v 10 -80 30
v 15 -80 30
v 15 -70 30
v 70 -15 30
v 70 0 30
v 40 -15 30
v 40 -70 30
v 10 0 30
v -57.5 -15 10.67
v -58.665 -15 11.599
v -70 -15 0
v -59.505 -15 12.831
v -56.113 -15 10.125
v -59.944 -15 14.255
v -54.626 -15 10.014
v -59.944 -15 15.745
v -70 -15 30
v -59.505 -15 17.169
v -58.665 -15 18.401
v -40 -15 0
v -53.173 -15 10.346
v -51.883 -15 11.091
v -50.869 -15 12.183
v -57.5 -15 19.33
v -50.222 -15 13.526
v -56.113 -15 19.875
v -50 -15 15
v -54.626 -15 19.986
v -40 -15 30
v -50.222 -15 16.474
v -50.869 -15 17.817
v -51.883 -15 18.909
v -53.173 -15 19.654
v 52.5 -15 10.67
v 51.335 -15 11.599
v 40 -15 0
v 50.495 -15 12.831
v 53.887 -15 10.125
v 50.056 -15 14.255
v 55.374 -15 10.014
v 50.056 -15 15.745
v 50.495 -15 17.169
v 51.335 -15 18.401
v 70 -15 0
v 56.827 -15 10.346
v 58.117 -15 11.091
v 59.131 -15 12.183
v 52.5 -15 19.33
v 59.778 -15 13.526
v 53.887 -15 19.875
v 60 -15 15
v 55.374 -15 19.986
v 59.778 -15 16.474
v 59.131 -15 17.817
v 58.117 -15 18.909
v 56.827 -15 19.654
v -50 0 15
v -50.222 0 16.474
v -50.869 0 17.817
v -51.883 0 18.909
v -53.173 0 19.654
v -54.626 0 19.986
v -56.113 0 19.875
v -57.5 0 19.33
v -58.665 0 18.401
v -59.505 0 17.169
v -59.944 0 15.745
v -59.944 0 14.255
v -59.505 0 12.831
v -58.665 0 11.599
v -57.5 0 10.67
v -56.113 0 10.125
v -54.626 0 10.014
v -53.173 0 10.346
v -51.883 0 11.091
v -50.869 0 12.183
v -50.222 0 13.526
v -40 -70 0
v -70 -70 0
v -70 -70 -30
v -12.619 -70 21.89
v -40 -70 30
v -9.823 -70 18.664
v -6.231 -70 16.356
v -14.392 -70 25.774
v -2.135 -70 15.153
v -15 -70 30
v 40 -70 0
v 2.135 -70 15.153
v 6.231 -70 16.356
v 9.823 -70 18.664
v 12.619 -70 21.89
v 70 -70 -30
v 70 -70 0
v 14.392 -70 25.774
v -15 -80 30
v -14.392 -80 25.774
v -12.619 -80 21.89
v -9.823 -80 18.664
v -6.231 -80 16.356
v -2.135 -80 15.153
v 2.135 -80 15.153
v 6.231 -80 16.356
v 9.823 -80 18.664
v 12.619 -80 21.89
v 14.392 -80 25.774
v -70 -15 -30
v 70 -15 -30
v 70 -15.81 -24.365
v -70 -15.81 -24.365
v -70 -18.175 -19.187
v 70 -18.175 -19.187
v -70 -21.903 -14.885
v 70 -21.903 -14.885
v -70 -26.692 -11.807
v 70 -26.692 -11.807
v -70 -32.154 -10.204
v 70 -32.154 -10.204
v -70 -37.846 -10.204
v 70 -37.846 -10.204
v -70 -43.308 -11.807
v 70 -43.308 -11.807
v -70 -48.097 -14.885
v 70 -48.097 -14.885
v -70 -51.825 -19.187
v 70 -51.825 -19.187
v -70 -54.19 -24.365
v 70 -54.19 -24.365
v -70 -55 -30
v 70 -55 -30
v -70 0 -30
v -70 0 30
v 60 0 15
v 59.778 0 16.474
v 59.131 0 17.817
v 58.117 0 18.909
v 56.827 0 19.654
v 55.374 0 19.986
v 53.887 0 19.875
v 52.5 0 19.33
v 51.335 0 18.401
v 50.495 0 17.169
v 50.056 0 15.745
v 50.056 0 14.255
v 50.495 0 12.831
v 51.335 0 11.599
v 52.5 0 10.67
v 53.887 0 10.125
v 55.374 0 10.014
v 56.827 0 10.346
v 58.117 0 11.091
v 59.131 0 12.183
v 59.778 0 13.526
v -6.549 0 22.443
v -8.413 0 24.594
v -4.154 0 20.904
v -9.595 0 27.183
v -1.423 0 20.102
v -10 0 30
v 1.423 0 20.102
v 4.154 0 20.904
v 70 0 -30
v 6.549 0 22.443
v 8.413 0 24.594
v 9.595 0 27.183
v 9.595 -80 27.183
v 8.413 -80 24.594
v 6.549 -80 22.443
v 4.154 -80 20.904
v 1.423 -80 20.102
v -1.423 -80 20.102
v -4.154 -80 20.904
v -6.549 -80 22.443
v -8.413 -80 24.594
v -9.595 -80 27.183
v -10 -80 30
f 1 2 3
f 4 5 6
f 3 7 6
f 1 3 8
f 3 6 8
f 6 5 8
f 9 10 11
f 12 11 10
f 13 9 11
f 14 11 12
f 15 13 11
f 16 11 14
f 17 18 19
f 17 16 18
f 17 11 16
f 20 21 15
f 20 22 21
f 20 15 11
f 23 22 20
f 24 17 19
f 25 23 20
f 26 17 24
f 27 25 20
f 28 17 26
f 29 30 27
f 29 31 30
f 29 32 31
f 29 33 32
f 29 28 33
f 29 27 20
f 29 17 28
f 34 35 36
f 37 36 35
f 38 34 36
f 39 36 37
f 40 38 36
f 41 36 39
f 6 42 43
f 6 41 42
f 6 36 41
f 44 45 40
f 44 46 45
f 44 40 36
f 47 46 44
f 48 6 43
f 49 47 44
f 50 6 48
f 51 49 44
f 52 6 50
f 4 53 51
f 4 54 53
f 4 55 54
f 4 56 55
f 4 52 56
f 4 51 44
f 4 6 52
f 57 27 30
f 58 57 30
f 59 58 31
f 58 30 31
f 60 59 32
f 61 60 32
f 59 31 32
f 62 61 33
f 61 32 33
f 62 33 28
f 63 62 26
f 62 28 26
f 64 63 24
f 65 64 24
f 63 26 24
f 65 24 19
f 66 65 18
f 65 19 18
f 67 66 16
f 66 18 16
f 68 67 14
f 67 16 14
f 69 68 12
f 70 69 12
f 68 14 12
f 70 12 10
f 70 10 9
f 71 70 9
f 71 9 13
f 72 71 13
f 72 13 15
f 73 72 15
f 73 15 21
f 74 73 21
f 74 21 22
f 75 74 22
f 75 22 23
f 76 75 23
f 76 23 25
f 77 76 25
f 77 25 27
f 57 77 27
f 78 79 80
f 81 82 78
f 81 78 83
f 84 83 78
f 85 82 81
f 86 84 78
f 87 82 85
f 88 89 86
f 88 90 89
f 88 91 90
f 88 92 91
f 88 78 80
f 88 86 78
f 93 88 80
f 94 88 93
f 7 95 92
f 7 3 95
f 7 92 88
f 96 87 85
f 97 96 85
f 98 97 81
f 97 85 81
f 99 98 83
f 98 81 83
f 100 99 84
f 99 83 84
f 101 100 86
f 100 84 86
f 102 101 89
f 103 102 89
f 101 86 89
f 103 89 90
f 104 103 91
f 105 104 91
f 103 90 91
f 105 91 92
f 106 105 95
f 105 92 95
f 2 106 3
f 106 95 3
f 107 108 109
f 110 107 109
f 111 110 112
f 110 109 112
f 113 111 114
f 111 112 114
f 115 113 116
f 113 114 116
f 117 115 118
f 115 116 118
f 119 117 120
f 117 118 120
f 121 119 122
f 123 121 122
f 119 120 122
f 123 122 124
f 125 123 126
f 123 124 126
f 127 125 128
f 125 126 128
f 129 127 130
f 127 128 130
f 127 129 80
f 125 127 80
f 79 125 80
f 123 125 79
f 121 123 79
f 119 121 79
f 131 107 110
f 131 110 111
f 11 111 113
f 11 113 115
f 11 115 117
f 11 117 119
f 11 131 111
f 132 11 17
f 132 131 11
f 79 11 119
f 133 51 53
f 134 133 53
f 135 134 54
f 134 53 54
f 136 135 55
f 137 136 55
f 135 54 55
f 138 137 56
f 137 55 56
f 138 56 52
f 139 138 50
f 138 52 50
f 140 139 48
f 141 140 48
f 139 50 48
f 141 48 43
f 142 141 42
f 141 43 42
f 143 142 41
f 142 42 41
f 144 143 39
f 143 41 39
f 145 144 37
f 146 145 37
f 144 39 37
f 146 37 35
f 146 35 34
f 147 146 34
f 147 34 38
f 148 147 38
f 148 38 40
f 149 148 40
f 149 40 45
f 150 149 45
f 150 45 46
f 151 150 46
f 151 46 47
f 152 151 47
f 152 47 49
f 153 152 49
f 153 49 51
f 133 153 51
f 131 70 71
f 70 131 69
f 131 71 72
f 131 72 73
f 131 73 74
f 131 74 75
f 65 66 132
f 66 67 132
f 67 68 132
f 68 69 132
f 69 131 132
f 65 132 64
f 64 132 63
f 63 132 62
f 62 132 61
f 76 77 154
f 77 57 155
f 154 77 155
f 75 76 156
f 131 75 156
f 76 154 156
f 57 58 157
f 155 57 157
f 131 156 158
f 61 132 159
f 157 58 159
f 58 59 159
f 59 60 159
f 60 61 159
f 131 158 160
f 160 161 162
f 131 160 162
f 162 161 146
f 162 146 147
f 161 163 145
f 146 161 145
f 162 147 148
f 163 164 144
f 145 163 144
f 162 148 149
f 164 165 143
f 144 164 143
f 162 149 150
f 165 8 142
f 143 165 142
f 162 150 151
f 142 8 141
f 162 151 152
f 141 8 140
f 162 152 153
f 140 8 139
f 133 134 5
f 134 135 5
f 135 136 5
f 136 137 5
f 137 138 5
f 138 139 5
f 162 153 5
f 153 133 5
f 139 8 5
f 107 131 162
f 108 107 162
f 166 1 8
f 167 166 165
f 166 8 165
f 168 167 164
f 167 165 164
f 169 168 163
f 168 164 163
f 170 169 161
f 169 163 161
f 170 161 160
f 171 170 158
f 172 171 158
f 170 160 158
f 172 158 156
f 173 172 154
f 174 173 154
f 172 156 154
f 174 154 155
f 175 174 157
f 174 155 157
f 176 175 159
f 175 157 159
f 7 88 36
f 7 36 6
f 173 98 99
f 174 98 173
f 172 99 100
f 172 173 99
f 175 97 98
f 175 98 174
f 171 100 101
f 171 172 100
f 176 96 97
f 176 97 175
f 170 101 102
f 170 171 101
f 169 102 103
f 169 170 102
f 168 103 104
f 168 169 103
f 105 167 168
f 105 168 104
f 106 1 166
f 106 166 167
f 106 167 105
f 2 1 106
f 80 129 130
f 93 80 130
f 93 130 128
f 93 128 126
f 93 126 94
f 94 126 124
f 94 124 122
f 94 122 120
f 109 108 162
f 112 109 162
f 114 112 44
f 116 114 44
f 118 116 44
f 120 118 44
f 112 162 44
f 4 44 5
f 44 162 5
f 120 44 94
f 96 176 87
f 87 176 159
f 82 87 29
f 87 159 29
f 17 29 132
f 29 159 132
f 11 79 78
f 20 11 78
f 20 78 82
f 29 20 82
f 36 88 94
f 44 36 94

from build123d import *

# Parameters (mm, degrees)
F0_W      = 140
F0_H      = 60
F1_DEPTH  = 70
F3_DEPTH  = 165
F4_W      = 30
F4_H      = 30
F5_DEPTH  = 55
F6_W      = 30
F6_H      = 30
F7_DEPTH  = 55
F8_R      = 5
F9_DEPTH  = 40
F10_R     = 5
F11_DEPTH = 40
F13_DEPTH = 100
F14_DEPTH = 10


with BuildPart() as f1:
    # F0 (on Front) → F1 (new body)
    with BuildSketch(Plane.XZ):
        Rectangle(F0_W, F0_H)
    extrude(amount=F1_DEPTH)

    # F2 (on face) → F3 (cut, symmetric)
    with BuildSketch(Plane.YZ.offset(70)):
        with BuildLine():
            Line((-55, -30), (-15, -30))
            ThreePointArc((-15, -30), (-35, -10), (-55, -30))
        make_face()
    extrude(amount=F3_DEPTH, both=True, mode=Mode.SUBTRACT)

    # F4 (on face) → F5 (cut)
    with BuildSketch(Plane.XZ.offset(70)):
        with Locations((55, 15)):
            Rectangle(F4_W, F4_H)
    extrude(amount=-F5_DEPTH, mode=Mode.SUBTRACT)

    # F6 (on face) → F7 (cut)
    with BuildSketch(Plane.XZ.offset(70)):
        with Locations((-55, 15)):
            Rectangle(F6_W, F6_H)
    extrude(amount=-F7_DEPTH, mode=Mode.SUBTRACT)

    # F8 (on face) → F9 (cut)
    with BuildSketch(Plane.XZ.offset(15)):
        with Locations((55, 15)):
            Circle(F8_R)
    extrude(amount=-F9_DEPTH, mode=Mode.SUBTRACT)

    # F10 (on face) → F11 (cut)
    with BuildSketch(Plane.XZ.offset(15)):
        with Locations((-55, 15)):
            Circle(F10_R)
    extrude(amount=-F11_DEPTH, mode=Mode.SUBTRACT)

    # F12 (on face) → F13 (cut)
    with BuildSketch(Plane.XZ.offset(70)):
        with BuildLine():
            ThreePointArc((-10, 30), (0, 20), (10, 30))
            Line((10, 30), (-10, 30))
        make_face()
        with BuildLine():
            Line((-10, 30), (10, 30))
            ThreePointArc((10, 30), (0, 40), (-10, 30))
        make_face()
        with BuildLine():
            ThreePointArc((-10, 30), (0, 40), (10, 30))
            Line((10, 30), (15, 30))
            ThreePointArc((15, 30), (0, 45), (-15, 30))
            Line((-15, 30), (-10, 30))
        make_face()
    extrude(amount=-F13_DEPTH, mode=Mode.SUBTRACT)

    # F12 (on face) → F14 (join)
    with BuildSketch(Plane.XZ.offset(70)):
        with BuildLine():
            Line((15, 30), (10, 30))
            ThreePointArc((10, 30), (0, 20), (-10, 30))
            Line((-10, 30), (-15, 30))
            ThreePointArc((-15, 30), (0, 15), (15, 30))
        make_face()
    extrude(amount=F14_DEPTH)


solid = f1.part
